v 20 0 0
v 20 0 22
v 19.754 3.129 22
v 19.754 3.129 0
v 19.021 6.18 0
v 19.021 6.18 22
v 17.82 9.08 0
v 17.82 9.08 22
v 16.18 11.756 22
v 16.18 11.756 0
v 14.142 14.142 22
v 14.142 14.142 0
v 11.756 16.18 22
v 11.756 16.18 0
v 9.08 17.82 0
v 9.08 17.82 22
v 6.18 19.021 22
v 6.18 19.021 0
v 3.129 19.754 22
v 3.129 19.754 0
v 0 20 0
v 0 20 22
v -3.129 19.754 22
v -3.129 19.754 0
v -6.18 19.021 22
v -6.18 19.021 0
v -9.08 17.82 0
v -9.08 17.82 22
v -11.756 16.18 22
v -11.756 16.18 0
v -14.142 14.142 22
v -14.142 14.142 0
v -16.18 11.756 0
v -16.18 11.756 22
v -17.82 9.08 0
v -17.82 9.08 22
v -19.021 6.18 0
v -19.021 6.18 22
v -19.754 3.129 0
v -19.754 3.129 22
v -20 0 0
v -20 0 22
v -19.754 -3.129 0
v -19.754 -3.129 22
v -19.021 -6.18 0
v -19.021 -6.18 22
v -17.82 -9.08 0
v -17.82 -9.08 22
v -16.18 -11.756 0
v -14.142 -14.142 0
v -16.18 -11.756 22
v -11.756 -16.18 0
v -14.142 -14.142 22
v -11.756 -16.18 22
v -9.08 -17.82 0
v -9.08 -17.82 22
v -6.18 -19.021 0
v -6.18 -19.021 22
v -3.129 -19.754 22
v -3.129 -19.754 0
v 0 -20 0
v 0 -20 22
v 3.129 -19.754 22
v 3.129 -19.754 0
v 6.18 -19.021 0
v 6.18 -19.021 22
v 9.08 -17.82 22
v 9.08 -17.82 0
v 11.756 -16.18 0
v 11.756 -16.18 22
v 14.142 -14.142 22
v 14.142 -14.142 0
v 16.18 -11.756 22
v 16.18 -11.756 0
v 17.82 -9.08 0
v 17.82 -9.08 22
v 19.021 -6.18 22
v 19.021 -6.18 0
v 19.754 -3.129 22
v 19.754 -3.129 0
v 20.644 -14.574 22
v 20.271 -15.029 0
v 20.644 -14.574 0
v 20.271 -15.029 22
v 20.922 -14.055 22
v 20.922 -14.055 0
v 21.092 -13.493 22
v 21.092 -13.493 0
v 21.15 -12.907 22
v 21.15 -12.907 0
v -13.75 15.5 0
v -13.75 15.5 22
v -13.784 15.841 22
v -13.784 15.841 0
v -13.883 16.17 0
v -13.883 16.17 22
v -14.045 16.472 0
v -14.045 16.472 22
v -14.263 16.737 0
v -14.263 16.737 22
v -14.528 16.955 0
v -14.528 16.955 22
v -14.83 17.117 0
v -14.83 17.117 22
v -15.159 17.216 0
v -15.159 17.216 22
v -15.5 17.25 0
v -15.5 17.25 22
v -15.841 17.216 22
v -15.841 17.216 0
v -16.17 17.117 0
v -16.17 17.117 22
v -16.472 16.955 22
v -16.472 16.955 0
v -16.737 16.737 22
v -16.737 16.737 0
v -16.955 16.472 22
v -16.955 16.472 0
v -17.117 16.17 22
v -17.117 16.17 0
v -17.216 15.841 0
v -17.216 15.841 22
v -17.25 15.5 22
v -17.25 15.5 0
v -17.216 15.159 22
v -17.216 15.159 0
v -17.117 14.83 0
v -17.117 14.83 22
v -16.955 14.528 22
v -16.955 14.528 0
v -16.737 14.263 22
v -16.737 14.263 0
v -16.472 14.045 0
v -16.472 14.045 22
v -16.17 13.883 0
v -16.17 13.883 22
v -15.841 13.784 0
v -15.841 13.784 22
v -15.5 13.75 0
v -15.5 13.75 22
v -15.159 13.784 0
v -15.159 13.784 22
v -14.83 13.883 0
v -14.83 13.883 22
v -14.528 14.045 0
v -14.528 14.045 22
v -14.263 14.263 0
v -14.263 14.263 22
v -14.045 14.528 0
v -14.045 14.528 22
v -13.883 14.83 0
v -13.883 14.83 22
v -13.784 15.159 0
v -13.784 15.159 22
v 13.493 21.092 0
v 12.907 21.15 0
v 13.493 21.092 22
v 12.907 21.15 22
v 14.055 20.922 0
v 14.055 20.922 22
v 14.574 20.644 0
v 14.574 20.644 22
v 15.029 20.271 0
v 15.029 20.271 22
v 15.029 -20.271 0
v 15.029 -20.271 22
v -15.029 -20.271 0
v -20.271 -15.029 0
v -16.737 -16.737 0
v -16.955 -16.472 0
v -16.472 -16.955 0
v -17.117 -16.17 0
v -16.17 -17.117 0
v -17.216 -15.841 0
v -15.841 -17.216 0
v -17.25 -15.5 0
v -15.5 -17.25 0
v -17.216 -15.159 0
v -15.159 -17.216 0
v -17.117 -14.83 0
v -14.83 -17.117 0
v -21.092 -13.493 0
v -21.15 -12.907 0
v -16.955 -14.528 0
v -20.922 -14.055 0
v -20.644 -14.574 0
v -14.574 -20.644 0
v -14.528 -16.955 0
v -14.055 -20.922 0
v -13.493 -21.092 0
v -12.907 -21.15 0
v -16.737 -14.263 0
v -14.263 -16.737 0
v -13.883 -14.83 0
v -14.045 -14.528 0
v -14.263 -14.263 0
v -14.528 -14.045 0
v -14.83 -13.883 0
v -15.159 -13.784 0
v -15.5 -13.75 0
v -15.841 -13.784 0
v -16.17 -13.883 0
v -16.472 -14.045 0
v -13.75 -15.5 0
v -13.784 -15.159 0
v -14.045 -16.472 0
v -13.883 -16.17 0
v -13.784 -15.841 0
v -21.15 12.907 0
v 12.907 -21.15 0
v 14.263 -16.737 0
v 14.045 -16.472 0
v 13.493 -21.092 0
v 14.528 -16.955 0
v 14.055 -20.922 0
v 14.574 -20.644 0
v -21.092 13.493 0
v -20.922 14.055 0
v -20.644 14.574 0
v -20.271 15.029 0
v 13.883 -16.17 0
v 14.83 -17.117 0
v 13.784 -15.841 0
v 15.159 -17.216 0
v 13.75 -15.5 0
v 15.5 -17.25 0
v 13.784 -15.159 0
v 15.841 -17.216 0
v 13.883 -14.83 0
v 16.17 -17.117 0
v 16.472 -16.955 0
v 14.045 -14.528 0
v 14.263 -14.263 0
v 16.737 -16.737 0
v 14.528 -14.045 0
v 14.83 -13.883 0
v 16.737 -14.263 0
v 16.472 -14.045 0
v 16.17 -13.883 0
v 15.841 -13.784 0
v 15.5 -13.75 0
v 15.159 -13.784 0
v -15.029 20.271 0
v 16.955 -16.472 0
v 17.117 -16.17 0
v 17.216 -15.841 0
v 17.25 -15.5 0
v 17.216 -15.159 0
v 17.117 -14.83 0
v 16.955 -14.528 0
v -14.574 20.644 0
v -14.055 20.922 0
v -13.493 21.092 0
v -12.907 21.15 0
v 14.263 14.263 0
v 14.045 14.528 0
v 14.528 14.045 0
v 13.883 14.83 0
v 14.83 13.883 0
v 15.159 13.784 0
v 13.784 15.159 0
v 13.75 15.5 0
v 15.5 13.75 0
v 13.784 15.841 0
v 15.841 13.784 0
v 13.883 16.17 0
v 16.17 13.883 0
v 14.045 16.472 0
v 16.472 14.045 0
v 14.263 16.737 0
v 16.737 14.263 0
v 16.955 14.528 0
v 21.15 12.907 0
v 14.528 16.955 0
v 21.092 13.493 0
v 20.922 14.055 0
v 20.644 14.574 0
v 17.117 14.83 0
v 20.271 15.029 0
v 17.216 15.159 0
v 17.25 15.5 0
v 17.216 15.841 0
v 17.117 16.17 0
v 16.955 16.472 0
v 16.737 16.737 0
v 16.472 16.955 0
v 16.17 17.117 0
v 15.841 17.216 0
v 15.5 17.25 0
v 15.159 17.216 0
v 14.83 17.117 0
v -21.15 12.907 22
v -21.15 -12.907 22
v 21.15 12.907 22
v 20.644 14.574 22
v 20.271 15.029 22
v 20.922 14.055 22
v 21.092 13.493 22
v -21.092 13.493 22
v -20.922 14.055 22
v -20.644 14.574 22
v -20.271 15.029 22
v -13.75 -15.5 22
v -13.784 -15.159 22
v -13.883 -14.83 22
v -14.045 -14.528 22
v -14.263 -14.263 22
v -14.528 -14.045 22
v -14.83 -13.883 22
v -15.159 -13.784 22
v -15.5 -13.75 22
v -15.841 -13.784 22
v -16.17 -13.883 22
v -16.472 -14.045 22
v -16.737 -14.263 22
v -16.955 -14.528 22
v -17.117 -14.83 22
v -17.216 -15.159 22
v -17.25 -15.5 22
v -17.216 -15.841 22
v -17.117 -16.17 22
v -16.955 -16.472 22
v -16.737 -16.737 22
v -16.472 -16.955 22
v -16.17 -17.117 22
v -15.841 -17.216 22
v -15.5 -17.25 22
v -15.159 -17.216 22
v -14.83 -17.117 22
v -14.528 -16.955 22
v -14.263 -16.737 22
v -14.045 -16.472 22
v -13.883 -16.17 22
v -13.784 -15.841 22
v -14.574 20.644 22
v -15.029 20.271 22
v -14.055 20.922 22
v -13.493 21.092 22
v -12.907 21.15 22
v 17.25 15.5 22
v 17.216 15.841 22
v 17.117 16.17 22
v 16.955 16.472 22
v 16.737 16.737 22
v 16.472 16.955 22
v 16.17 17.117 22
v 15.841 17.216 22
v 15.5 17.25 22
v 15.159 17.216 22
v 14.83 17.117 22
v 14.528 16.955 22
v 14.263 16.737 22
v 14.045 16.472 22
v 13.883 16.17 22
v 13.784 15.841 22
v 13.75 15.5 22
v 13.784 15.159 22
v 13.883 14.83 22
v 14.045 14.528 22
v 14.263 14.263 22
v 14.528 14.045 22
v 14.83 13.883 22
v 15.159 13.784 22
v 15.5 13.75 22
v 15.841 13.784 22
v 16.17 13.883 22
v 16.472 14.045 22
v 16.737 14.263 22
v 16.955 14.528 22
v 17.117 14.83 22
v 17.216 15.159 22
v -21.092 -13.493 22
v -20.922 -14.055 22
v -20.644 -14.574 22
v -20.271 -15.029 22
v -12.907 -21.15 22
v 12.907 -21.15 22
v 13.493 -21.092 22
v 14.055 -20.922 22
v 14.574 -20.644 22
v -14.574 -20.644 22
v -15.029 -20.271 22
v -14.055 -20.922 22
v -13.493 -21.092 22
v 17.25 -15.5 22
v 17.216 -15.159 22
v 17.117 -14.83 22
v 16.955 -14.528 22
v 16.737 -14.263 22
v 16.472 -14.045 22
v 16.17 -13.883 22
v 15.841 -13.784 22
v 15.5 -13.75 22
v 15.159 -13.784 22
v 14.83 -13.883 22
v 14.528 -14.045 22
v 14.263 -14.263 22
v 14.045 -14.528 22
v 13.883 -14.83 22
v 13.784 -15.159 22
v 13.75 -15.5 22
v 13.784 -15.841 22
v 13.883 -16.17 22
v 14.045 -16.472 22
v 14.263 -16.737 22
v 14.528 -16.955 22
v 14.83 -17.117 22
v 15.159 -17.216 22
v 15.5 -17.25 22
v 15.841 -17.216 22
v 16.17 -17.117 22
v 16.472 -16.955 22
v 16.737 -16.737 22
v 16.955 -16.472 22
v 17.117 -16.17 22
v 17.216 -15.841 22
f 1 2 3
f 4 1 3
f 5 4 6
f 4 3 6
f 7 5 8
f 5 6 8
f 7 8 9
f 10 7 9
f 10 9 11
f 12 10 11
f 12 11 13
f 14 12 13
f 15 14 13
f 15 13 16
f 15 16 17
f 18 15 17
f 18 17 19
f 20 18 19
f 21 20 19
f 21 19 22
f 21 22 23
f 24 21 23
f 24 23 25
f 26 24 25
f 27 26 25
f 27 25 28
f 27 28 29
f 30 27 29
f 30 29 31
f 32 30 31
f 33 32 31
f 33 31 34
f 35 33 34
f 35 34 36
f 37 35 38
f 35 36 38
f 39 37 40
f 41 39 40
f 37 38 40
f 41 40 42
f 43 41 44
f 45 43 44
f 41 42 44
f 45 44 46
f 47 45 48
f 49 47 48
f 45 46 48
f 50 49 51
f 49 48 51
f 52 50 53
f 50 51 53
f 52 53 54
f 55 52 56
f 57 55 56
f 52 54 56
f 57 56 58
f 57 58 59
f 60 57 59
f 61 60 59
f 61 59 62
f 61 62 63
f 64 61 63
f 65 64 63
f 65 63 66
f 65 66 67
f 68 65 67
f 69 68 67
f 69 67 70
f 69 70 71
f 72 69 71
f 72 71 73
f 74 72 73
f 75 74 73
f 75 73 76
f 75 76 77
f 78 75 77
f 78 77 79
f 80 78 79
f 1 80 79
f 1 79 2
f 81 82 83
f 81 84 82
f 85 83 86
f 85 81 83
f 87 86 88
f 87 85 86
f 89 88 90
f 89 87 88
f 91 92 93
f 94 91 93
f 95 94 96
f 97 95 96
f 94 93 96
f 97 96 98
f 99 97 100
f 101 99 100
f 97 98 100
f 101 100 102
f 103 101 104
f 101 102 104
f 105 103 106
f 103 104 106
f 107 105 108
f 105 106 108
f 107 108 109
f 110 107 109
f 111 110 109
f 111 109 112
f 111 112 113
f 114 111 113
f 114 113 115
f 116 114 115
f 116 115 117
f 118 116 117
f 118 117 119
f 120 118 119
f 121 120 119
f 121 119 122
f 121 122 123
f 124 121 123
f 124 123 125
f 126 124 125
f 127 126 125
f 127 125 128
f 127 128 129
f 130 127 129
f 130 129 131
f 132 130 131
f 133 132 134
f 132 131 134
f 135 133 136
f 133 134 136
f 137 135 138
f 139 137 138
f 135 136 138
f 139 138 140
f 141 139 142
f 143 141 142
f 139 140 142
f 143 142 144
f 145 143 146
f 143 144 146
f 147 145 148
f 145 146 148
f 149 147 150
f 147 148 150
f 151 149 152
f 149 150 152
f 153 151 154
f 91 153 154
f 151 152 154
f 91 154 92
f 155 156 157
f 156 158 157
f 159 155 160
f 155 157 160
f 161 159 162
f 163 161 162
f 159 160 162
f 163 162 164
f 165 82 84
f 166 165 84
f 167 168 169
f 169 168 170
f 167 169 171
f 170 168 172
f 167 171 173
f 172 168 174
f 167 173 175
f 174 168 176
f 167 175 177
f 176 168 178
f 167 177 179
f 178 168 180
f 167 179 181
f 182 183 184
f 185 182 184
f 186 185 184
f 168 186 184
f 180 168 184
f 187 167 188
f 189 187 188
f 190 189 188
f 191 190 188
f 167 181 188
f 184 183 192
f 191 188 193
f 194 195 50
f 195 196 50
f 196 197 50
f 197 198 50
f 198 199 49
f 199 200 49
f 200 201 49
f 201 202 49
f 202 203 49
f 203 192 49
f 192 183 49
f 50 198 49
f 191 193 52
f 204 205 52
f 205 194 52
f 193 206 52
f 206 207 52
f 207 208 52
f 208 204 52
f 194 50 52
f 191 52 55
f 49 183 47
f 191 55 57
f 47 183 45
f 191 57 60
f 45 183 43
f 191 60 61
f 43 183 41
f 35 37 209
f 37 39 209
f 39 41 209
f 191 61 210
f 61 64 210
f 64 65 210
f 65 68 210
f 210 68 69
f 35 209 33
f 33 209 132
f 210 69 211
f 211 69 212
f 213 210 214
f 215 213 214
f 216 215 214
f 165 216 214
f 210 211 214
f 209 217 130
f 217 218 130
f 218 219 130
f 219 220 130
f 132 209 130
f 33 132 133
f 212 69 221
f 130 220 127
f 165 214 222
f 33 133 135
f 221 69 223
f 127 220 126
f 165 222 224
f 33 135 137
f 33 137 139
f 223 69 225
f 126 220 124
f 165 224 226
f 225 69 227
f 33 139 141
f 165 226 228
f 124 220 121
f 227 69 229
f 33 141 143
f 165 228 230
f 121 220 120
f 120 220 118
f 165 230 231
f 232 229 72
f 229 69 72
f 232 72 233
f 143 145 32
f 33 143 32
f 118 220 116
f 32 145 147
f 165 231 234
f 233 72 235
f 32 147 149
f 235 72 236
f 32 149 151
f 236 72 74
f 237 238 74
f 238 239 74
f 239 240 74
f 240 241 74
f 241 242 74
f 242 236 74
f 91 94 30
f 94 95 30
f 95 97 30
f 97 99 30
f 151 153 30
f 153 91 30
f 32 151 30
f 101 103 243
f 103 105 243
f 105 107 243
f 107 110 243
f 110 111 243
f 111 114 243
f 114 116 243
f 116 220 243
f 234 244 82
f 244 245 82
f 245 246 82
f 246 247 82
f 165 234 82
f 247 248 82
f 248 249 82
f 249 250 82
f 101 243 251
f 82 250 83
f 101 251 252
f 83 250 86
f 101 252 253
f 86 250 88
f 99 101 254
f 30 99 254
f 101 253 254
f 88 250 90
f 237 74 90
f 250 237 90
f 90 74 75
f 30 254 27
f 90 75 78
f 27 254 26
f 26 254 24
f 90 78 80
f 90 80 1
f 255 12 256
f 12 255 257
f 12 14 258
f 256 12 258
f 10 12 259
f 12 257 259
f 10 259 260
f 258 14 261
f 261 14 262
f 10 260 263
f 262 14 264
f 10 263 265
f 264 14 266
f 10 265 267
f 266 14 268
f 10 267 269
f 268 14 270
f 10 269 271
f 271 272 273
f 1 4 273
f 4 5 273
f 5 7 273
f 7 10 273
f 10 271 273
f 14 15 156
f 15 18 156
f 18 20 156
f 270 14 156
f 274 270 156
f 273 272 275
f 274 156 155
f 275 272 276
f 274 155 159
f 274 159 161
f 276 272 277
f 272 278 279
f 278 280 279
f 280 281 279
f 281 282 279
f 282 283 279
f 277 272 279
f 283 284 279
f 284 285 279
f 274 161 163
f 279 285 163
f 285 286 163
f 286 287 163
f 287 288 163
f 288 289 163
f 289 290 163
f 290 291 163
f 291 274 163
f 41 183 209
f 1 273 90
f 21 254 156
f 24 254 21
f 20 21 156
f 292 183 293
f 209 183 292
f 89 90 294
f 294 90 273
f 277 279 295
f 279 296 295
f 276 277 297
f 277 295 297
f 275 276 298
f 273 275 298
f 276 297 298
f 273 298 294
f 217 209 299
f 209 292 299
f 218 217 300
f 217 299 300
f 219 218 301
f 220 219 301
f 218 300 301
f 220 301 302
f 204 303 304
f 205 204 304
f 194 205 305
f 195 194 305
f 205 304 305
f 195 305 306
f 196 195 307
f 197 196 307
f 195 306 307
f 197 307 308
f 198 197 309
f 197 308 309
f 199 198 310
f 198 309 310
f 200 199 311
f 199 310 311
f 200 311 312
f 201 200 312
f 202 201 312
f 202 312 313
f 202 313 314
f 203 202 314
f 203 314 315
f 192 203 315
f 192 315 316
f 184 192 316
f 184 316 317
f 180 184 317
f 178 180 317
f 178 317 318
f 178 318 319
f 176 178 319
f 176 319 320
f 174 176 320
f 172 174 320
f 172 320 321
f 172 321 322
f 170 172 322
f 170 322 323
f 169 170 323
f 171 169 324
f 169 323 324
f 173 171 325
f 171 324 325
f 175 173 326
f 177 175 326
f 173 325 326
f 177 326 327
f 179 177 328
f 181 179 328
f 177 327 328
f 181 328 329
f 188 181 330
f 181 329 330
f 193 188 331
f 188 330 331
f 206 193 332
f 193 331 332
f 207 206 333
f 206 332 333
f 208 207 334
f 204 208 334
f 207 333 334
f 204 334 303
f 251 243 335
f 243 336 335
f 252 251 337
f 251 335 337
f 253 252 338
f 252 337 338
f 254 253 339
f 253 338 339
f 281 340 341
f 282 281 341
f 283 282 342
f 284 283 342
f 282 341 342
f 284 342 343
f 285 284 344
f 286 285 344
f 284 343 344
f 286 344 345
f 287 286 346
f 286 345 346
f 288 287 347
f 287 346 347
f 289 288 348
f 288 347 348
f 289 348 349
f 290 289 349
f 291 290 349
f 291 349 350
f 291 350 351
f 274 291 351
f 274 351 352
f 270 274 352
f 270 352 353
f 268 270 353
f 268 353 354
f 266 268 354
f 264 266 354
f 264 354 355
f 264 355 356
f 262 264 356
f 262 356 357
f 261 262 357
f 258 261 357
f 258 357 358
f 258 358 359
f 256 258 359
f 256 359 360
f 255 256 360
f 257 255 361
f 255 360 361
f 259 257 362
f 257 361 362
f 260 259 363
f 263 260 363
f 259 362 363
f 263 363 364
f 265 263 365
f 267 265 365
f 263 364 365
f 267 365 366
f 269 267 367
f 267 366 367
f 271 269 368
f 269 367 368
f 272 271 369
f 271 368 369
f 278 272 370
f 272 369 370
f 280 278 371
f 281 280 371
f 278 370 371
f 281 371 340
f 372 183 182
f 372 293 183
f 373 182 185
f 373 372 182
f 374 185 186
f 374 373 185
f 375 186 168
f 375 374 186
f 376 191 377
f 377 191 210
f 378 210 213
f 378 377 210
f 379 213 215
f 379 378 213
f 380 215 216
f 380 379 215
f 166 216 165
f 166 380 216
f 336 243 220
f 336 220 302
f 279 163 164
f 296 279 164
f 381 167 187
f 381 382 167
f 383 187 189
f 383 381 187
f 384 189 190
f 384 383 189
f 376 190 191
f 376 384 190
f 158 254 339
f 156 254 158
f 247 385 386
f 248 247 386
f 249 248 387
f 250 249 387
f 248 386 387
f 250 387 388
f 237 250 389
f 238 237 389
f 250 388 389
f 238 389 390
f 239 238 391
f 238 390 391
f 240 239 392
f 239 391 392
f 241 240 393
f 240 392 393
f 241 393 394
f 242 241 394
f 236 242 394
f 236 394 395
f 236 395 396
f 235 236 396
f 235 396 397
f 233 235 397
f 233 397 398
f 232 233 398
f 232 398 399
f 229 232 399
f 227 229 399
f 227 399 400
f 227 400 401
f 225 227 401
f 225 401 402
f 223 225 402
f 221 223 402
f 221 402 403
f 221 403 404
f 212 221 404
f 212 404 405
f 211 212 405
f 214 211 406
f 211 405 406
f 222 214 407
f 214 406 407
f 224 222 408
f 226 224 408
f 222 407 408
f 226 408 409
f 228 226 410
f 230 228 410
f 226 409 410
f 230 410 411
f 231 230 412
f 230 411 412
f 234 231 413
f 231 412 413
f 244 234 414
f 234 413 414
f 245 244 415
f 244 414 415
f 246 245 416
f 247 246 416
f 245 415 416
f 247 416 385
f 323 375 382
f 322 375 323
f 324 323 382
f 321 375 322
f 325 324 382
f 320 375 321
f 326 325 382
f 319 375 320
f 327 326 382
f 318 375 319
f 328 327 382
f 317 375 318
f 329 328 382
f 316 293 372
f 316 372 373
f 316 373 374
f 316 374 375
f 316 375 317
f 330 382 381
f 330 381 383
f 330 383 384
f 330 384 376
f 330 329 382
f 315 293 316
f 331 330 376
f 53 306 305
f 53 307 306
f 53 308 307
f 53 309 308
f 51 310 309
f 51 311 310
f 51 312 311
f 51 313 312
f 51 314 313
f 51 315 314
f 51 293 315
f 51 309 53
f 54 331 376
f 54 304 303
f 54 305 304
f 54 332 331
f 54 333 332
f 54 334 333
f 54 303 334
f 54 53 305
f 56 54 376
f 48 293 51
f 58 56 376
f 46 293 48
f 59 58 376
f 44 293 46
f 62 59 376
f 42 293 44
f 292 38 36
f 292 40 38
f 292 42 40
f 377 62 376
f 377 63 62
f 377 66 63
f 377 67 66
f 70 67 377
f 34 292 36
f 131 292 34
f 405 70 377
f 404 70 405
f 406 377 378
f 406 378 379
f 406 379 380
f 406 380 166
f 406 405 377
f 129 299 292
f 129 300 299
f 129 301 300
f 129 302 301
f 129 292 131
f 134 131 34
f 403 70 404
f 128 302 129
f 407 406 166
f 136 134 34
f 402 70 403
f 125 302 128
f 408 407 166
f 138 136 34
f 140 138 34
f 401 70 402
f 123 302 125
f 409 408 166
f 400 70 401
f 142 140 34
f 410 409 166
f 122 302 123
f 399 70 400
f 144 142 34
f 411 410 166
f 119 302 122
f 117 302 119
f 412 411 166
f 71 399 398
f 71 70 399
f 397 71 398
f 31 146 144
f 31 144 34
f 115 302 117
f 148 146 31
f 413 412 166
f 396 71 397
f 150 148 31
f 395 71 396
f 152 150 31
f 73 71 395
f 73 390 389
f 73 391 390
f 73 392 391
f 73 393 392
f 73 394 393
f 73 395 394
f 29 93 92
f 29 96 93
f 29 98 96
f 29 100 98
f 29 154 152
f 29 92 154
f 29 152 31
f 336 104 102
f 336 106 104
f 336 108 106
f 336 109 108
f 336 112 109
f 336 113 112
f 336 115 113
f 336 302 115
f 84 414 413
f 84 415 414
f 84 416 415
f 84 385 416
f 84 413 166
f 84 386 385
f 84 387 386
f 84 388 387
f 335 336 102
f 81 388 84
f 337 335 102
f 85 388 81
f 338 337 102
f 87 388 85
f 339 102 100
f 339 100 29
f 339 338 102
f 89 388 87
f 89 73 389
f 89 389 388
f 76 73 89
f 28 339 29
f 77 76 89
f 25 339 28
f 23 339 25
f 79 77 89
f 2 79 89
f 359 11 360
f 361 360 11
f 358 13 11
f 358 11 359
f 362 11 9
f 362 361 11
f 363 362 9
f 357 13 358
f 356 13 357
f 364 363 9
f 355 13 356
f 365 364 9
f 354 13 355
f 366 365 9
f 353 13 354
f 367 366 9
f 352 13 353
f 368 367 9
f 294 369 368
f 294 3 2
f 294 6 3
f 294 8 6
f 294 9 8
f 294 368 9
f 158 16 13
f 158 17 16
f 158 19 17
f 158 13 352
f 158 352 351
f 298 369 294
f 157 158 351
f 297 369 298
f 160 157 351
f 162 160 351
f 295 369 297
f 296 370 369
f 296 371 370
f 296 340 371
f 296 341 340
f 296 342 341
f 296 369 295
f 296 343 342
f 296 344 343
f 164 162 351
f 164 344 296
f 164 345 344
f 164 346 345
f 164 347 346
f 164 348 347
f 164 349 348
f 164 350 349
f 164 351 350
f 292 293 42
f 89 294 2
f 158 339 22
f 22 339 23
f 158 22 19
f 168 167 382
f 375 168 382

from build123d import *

# Parameters (mm, degrees)
SZKIC1_W                    = 42.3
SZKIC1_H                    = 42.3
DODANIE_WYCI_GNI_CIE1_DEPTH = 22
SFAZOWANIE1_SIZE            = 7
ZAOKR_GLENIE1_R             = 3
WYTNIJ_WYCI_GNI_CIE1_REACH  = 39.13
SZKIC2_R                    = 20
SZKIC2_R_2                  = 1.75


with BuildPart() as part:
    # Szkic1 → Dodanie-wyciągnięcie1 (new body)
    with BuildSketch(Plane.XY):
        Rectangle(SZKIC1_W, SZKIC1_H)
    extrude(amount=DODANIE_WYCI_GNI_CIE1_DEPTH)

    # Sfazowanie1
    sfazowanie1_edges = [part.edges().sort_by_distance(p)[0] for p in [
        (21.15, -21.15, 11),
        (-21.15, -21.15, 11),
        (-21.15, 21.15, 11),
        (21.15, 21.15, 11),
    ]]
    chamfer(sfazowanie1_edges, length=SFAZOWANIE1_SIZE)

    # Zaokrąglenie1
    zaokr_glenie1_edges = [part.edges().sort_by_distance(p)[0] for p in [
        (14.15, -21.15, 11),
        (-14.15, -21.15, 11),
        (-21.15, 14.15, 11),
        (-21.15, -14.15, 11),
        (21.15, 14.15, 11),
        (21.15, -14.15, 11),
        (14.15, 21.15, 11),
        (-14.15, 21.15, 11),
    ]]
    fillet(zaokr_glenie1_edges, radius=ZAOKR_GLENIE1_R)

    # Szkic2 → Wytnij-wyciągnięcie1 (cut, up to next)
    with BuildSketch(Plane.XY.offset(22), mode=Mode.PRIVATE) as wytnij_wyci_gni_cie1_sk1:
        Circle(SZKIC2_R)
    wytnij_wyci_gni_cie1_tool1 = extrude(wytnij_wyci_gni_cie1_sk1.sketch, amount=-WYTNIJ_WYCI_GNI_CIE1_REACH, mode=Mode.PRIVATE) & part.part
    # Szkic2 → Wytnij-wyciągnięcie1 (cut, up to next)
    with BuildSketch(Plane.XY.offset(22), mode=Mode.PRIVATE) as wytnij_wyci_gni_cie1_sk2:
        with Locations((-15.5, 15.5)):
            Circle(SZKIC2_R_2)
    wytnij_wyci_gni_cie1_tool2 = extrude(wytnij_wyci_gni_cie1_sk2.sketch, amount=-WYTNIJ_WYCI_GNI_CIE1_REACH, mode=Mode.PRIVATE) & part.part
    # Szkic2 → Wytnij-wyciągnięcie1 (cut, up to next)
    with BuildSketch(Plane.XY.offset(22), mode=Mode.PRIVATE) as wytnij_wyci_gni_cie1_sk3:
        with Locations((15.5, 15.5)):
            Circle(SZKIC2_R_2)
    wytnij_wyci_gni_cie1_tool3 = extrude(wytnij_wyci_gni_cie1_sk3.sketch, amount=-WYTNIJ_WYCI_GNI_CIE1_REACH, mode=Mode.PRIVATE) & part.part
    # Szkic2 → Wytnij-wyciągnięcie1 (cut, up to next)
    with BuildSketch(Plane.XY.offset(22), mode=Mode.PRIVATE) as wytnij_wyci_gni_cie1_sk4:
        with Locations((15.5, -15.5)):
            Circle(SZKIC2_R_2)
    wytnij_wyci_gni_cie1_tool4 = extrude(wytnij_wyci_gni_cie1_sk4.sketch, amount=-WYTNIJ_WYCI_GNI_CIE1_REACH, mode=Mode.PRIVATE) & part.part
    # Szkic2 → Wytnij-wyciągnięcie1 (cut, up to next)
    with BuildSketch(Plane.XY.offset(22), mode=Mode.PRIVATE) as wytnij_wyci_gni_cie1_sk5:
        with Locations((-15.5, -15.5)):
            Circle(SZKIC2_R_2)
    wytnij_wyci_gni_cie1_tool5 = extrude(wytnij_wyci_gni_cie1_sk5.sketch, amount=-WYTNIJ_WYCI_GNI_CIE1_REACH, mode=Mode.PRIVATE) & part.part
    add(wytnij_wyci_gni_cie1_tool1.solids().sort_by_distance((0, 0, 22))[0], mode=Mode.SUBTRACT)
    add(wytnij_wyci_gni_cie1_tool2.solids().sort_by_distance((-15.5, 15.5, 22))[0], mode=Mode.SUBTRACT)
    add(wytnij_wyci_gni_cie1_tool3.solids().sort_by_distance((15.5, 15.5, 22))[0], mode=Mode.SUBTRACT)
    add(wytnij_wyci_gni_cie1_tool4.solids().sort_by_distance((15.5, -15.5, 22))[0], mode=Mode.SUBTRACT)
    add(wytnij_wyci_gni_cie1_tool5.solids().sort_by_distance((-15.5, -15.5, 22))[0], mode=Mode.SUBTRACT)


solid = part.part
